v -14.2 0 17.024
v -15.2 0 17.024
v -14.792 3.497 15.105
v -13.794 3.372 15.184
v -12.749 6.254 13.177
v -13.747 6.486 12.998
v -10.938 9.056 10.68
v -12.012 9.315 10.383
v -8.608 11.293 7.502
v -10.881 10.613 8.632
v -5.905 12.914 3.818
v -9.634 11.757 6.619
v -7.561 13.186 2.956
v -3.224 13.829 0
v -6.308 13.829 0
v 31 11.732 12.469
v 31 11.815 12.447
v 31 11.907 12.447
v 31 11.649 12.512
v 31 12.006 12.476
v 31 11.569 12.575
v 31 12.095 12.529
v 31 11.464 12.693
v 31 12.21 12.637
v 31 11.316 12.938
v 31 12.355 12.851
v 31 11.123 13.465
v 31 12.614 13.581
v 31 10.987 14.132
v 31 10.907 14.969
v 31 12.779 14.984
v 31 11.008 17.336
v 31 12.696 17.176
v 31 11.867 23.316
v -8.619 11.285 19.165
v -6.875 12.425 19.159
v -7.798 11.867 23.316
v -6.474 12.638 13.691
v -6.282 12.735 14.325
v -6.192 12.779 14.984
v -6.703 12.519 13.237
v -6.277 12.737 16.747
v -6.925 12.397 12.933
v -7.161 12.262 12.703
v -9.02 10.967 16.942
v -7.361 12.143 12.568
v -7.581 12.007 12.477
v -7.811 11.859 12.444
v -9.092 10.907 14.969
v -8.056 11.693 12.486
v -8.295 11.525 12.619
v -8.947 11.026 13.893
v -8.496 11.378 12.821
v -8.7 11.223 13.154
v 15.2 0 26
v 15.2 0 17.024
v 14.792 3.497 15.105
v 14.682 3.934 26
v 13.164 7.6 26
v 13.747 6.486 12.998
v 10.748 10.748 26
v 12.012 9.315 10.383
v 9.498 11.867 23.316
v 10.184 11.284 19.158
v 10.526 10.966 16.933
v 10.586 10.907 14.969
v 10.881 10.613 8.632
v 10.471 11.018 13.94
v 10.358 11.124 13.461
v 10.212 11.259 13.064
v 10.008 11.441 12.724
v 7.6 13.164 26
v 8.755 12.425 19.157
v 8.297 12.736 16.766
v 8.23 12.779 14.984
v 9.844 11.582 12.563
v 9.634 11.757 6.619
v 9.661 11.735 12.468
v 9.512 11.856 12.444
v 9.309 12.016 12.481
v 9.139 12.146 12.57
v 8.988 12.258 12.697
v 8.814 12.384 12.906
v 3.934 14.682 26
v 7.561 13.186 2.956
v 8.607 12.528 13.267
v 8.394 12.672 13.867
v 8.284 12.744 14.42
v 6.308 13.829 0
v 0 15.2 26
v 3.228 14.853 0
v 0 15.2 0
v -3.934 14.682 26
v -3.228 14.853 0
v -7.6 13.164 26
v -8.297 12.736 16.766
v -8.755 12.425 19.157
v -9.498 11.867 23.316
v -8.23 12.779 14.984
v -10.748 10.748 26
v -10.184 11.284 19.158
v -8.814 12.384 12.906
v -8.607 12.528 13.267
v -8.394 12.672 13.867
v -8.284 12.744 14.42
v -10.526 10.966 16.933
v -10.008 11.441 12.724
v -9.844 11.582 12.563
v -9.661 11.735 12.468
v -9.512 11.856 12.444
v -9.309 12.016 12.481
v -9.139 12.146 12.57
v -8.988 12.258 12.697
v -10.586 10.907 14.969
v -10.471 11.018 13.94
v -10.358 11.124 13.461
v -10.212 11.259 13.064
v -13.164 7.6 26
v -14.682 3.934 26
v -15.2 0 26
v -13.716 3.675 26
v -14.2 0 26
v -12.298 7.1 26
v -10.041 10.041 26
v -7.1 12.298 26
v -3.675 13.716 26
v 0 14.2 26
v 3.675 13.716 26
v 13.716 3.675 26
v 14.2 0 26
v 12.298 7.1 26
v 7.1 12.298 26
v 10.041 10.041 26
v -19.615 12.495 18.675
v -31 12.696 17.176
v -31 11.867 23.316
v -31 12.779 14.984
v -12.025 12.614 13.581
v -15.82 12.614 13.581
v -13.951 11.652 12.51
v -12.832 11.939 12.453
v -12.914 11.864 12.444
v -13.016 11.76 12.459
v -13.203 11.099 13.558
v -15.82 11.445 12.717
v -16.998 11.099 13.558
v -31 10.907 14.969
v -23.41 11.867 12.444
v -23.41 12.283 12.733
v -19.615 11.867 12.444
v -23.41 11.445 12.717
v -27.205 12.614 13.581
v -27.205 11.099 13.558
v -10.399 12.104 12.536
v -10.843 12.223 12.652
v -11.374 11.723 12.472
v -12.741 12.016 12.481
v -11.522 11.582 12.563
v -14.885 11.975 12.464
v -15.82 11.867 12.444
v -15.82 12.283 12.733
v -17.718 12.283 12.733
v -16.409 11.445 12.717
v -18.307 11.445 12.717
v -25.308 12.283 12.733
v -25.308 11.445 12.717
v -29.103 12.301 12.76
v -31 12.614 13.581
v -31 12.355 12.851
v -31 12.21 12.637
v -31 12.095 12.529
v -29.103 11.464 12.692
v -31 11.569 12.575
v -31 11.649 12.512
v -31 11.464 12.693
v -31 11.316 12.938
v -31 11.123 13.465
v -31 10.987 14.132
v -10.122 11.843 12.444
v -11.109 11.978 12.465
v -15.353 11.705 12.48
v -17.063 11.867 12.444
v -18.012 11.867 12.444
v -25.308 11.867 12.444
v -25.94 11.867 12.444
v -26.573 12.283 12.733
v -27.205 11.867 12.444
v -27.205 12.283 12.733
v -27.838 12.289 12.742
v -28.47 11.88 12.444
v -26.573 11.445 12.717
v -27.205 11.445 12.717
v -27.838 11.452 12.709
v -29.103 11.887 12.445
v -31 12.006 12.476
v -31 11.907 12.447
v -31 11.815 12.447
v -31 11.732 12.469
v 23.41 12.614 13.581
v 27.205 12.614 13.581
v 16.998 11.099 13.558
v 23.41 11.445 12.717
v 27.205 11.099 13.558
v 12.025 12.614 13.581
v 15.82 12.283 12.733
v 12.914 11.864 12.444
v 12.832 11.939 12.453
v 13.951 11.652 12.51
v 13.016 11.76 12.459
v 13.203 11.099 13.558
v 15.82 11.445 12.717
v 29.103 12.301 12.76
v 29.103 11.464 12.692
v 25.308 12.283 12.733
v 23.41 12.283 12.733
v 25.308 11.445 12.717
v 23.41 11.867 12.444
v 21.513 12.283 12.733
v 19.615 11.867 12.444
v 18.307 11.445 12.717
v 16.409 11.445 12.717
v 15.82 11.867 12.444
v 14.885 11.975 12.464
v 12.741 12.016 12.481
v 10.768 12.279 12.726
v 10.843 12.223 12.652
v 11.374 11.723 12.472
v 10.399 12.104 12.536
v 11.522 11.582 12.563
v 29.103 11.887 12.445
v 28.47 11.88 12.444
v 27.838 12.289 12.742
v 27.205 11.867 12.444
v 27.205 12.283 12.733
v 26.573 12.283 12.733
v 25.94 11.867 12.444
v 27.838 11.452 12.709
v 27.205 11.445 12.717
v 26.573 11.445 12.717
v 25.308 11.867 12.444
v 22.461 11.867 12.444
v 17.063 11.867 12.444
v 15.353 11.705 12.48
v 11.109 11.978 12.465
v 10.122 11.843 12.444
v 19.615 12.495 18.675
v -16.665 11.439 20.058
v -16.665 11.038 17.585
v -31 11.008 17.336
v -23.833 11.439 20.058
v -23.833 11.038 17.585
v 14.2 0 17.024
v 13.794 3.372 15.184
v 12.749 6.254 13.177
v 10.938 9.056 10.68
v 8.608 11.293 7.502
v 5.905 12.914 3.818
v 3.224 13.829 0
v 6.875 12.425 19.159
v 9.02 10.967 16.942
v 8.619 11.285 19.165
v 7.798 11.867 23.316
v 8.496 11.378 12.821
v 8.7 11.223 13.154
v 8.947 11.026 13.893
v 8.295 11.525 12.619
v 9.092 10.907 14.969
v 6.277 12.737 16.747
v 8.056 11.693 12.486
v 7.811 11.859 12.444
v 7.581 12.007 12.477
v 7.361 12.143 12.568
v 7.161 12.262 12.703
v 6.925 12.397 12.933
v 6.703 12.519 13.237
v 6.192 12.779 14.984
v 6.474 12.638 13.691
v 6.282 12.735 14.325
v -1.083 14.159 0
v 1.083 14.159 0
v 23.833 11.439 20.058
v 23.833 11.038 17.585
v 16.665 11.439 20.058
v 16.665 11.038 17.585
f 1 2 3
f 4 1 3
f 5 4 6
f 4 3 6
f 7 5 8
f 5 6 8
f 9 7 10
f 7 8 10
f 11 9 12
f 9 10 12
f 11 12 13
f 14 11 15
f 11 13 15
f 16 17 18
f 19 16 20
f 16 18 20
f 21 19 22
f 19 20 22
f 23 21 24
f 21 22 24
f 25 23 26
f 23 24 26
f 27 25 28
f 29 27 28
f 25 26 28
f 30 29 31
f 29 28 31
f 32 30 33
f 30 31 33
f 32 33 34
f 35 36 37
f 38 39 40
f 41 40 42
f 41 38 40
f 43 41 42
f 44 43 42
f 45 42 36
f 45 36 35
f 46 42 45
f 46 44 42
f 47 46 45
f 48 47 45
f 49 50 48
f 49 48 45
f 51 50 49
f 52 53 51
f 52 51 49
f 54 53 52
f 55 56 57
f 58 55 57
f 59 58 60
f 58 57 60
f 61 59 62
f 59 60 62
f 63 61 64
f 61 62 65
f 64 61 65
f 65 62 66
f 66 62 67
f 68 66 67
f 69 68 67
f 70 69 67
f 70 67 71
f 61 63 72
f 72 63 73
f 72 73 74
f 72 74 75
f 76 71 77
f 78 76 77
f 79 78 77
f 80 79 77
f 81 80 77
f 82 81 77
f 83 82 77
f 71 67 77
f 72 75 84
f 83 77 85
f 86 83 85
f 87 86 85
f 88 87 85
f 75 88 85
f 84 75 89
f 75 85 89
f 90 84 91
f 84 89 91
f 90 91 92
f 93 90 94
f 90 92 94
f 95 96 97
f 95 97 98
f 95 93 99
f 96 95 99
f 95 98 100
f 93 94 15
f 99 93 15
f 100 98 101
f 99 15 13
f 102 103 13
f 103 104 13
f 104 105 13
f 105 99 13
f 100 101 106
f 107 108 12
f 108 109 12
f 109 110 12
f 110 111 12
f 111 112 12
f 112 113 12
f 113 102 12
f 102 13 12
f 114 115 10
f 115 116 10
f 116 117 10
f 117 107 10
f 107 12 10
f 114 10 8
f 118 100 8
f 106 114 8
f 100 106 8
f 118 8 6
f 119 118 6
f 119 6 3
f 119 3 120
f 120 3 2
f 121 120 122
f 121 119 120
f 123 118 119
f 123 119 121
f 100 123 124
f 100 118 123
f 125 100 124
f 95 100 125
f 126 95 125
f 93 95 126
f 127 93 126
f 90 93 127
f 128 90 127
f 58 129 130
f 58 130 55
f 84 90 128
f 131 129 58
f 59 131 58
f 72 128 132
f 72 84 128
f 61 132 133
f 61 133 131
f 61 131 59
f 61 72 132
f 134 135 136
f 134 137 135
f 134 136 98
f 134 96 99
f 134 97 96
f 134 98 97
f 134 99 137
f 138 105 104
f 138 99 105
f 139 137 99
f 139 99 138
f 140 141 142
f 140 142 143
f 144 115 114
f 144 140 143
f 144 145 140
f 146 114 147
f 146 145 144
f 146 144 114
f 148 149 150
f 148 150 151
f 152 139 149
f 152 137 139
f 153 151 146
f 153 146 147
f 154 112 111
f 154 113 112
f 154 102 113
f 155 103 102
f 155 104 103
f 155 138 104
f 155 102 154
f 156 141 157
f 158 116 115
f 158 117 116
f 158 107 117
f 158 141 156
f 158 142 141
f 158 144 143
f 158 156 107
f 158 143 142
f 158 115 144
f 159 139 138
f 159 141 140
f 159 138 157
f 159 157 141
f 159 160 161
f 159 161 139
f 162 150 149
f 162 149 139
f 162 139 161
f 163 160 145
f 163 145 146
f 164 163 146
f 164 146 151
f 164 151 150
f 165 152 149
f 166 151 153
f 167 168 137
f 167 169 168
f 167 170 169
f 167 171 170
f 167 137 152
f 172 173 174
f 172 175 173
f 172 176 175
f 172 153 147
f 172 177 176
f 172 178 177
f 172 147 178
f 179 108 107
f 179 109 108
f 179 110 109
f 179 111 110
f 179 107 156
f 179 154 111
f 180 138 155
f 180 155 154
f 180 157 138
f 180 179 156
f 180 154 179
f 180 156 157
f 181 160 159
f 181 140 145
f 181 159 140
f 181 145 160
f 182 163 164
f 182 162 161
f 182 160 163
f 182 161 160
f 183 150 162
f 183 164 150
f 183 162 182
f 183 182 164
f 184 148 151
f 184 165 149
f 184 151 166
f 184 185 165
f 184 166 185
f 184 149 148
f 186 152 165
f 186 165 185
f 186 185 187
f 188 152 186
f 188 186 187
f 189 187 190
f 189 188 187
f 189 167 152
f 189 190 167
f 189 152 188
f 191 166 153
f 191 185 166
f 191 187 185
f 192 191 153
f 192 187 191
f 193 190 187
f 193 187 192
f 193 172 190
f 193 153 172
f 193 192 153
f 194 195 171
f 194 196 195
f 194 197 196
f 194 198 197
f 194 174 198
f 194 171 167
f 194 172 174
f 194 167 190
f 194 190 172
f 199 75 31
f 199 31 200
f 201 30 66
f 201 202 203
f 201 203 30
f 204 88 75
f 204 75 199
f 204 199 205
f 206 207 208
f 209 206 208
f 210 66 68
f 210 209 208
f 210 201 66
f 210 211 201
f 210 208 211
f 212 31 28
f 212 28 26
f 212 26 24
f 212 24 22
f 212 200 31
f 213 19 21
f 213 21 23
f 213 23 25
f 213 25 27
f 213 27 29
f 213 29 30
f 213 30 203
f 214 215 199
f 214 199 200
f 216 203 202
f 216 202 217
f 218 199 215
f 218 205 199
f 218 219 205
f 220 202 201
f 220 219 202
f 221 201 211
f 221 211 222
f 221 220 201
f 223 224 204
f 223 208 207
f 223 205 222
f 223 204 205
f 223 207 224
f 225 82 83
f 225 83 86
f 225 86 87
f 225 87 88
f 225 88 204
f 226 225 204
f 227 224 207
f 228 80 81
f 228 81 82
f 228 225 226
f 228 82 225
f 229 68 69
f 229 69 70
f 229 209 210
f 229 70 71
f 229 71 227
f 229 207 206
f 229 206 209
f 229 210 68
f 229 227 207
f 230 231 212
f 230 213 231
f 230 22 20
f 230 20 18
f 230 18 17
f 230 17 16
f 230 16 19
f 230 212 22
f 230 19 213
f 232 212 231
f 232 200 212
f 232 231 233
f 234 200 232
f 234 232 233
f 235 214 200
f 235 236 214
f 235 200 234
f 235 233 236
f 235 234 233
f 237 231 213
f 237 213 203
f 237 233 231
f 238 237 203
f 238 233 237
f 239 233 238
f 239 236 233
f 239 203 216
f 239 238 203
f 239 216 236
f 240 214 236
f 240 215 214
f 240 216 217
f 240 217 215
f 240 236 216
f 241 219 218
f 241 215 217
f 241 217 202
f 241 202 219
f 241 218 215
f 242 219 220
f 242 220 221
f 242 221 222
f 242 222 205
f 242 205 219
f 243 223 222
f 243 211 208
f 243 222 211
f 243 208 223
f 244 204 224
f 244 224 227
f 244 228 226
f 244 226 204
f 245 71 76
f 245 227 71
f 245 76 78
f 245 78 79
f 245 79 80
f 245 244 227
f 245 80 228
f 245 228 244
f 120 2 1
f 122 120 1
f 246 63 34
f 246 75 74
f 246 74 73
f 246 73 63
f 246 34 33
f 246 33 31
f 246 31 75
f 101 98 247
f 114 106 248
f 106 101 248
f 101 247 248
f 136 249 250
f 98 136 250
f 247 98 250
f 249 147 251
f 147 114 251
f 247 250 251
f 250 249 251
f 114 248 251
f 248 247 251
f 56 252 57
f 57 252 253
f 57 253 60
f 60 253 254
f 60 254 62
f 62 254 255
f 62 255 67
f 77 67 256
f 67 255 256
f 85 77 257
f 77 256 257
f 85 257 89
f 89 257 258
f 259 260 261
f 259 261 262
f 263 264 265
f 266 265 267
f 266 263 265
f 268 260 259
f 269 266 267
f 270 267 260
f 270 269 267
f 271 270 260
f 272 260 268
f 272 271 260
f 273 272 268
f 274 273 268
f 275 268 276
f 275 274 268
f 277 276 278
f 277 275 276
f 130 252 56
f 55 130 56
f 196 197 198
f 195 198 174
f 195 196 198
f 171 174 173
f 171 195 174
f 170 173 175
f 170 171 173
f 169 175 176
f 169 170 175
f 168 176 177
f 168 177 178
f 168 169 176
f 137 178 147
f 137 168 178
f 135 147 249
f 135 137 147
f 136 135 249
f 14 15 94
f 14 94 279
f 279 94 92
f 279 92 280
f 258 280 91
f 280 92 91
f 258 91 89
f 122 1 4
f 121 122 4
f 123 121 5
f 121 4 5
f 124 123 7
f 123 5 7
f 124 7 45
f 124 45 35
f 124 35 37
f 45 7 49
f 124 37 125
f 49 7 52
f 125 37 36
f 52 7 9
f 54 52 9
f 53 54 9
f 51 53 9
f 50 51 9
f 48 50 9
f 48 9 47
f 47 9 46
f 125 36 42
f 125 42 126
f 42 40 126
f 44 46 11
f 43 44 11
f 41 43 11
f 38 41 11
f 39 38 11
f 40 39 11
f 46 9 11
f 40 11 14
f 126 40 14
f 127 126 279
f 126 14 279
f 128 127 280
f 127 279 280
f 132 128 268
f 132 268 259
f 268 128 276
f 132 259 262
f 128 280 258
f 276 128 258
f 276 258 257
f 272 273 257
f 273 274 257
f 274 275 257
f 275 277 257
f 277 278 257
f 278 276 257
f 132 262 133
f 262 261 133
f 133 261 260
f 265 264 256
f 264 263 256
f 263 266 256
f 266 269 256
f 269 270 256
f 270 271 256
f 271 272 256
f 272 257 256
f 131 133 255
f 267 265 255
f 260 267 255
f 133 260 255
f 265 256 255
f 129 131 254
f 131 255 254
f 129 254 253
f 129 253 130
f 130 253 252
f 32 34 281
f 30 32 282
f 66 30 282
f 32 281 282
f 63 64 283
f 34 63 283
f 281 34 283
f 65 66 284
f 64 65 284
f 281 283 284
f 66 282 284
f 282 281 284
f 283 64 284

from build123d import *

# Parameters (mm, degrees)
REARWINGBASE_DEPTH   = 26
CLEARENCE_DEPTH      = 26
CLEARENCE_DEPTH_BACK = 26
REARWING_DEPTH       = 31
REARWING_DEPTH_BACK  = 31
CLEARENCE2_START     = -26
SKETCH10_R           = 14.2
CLEARENCE2_DEPTH     = 26


with BuildPart() as part:
    # Sketch4 → RearWingBase (new body)
    with BuildSketch(Plane.XY):
        with BuildLine():
            Line((-15.2, 0), (-14.2, 0))
            ThreePointArc((-14.2, 0), (0, 14.2), (14.2, 0))
            Line((14.2, 0), (15.2, 0))
            ThreePointArc((15.2, 0), (0, 15.2), (-15.2, 0))
        make_face()
    extrude(amount=REARWINGBASE_DEPTH)

    # Sketch6 → Clearence (cut, two sides: drawn at the far end of the back side and taken through both)
    with BuildSketch(Plane(origin=(0, 0, 0), x_dir=(0, 0, -1), z_dir=(1, 0, 0)).offset(-CLEARENCE_DEPTH_BACK)):
        with BuildLine():
            Line((0.002719324, 15.197805772), (0.002719324, 13.829604024))
            add(Edge.make_bspline(
                [(0, 13.829225922), (0.000906491, 13.829352033), (0.001812932, 13.829478067), (0.002719324, 13.829604024)],
                knots=[0.999883326, 0.999883326, 0.999883326, 0.999883326, 1, 1, 1, 1], degree=3))
            add(Edge.make_bspline(
                [(-19.095204108, -5.766909468), (-17.667809088, -0.279268361), (-14.718368277, 4.473703473), (-9.162118992, 11.138171669), (-3.698103032, 13.314743837), (0, 13.829225922)],
                knots=[0, 0, 0, 0, 0.423900901, 0.523900901, 0.999883326, 0.999883326, 0.999883326, 0.999883326], degree=3))
            Line((-19.095204108, -5.766909468), (5.416214623, -5.766909468))
            Line((5.416214623, -5.766909468), (5.416214623, 15.197805772))
            Line((5.416214623, 15.197805772), (0.002719324, 15.197805772))
        make_face()
    extrude(amount=CLEARENCE_DEPTH + CLEARENCE_DEPTH_BACK, mode=Mode.SUBTRACT)

    # Sketch7 → RearWing (add, two sides: drawn at the far end of the back side and taken through both)
    with BuildSketch(Plane(origin=(0, 0, 0), x_dir=(0, 0, -1), z_dir=(1, 0, 0)).offset(-REARWING_DEPTH_BACK)):
        with BuildLine():
            add(Edge.make_bspline(
                [(-23.31622835, 11.867098708), (-21.717058728, 12.055213608), (-17.709554302, 12.634200705), (-16.496163082, 12.809494118), (-14.984125288, 12.779042837)],
                knots=[0, 0, 0, 0, 0.450119824, 1, 1, 1, 1], degree=3))
            add(Edge.make_bspline(
                [(-14.984125288, 12.779042837), (-11.626410325, 12.668851451), (-11.573129472, 11.081257235), (-14.968657337, 10.907420766)],
                knots=[0, 0, 0, 0, 1, 1, 1, 1], degree=3))
            add(Edge.make_bspline(
                [(-23.31622835, 11.867098708), (-19.356721106, 11.506371016), (-17.965634836, 10.821641279), (-14.968657337, 10.907420766)],
                knots=[0, 0, 0, 0, 1, 1, 1, 1], degree=3))
        make_face()
    extrude(amount=REARWING_DEPTH + REARWING_DEPTH_BACK)

    # Sketch10 → Clearence2 (cut)
    with BuildSketch(Plane.XY.offset(26).offset(CLEARENCE2_START)):
        Circle(SKETCH10_R)
    extrude(amount=CLEARENCE2_DEPTH, mode=Mode.SUBTRACT)


solid = part.part
